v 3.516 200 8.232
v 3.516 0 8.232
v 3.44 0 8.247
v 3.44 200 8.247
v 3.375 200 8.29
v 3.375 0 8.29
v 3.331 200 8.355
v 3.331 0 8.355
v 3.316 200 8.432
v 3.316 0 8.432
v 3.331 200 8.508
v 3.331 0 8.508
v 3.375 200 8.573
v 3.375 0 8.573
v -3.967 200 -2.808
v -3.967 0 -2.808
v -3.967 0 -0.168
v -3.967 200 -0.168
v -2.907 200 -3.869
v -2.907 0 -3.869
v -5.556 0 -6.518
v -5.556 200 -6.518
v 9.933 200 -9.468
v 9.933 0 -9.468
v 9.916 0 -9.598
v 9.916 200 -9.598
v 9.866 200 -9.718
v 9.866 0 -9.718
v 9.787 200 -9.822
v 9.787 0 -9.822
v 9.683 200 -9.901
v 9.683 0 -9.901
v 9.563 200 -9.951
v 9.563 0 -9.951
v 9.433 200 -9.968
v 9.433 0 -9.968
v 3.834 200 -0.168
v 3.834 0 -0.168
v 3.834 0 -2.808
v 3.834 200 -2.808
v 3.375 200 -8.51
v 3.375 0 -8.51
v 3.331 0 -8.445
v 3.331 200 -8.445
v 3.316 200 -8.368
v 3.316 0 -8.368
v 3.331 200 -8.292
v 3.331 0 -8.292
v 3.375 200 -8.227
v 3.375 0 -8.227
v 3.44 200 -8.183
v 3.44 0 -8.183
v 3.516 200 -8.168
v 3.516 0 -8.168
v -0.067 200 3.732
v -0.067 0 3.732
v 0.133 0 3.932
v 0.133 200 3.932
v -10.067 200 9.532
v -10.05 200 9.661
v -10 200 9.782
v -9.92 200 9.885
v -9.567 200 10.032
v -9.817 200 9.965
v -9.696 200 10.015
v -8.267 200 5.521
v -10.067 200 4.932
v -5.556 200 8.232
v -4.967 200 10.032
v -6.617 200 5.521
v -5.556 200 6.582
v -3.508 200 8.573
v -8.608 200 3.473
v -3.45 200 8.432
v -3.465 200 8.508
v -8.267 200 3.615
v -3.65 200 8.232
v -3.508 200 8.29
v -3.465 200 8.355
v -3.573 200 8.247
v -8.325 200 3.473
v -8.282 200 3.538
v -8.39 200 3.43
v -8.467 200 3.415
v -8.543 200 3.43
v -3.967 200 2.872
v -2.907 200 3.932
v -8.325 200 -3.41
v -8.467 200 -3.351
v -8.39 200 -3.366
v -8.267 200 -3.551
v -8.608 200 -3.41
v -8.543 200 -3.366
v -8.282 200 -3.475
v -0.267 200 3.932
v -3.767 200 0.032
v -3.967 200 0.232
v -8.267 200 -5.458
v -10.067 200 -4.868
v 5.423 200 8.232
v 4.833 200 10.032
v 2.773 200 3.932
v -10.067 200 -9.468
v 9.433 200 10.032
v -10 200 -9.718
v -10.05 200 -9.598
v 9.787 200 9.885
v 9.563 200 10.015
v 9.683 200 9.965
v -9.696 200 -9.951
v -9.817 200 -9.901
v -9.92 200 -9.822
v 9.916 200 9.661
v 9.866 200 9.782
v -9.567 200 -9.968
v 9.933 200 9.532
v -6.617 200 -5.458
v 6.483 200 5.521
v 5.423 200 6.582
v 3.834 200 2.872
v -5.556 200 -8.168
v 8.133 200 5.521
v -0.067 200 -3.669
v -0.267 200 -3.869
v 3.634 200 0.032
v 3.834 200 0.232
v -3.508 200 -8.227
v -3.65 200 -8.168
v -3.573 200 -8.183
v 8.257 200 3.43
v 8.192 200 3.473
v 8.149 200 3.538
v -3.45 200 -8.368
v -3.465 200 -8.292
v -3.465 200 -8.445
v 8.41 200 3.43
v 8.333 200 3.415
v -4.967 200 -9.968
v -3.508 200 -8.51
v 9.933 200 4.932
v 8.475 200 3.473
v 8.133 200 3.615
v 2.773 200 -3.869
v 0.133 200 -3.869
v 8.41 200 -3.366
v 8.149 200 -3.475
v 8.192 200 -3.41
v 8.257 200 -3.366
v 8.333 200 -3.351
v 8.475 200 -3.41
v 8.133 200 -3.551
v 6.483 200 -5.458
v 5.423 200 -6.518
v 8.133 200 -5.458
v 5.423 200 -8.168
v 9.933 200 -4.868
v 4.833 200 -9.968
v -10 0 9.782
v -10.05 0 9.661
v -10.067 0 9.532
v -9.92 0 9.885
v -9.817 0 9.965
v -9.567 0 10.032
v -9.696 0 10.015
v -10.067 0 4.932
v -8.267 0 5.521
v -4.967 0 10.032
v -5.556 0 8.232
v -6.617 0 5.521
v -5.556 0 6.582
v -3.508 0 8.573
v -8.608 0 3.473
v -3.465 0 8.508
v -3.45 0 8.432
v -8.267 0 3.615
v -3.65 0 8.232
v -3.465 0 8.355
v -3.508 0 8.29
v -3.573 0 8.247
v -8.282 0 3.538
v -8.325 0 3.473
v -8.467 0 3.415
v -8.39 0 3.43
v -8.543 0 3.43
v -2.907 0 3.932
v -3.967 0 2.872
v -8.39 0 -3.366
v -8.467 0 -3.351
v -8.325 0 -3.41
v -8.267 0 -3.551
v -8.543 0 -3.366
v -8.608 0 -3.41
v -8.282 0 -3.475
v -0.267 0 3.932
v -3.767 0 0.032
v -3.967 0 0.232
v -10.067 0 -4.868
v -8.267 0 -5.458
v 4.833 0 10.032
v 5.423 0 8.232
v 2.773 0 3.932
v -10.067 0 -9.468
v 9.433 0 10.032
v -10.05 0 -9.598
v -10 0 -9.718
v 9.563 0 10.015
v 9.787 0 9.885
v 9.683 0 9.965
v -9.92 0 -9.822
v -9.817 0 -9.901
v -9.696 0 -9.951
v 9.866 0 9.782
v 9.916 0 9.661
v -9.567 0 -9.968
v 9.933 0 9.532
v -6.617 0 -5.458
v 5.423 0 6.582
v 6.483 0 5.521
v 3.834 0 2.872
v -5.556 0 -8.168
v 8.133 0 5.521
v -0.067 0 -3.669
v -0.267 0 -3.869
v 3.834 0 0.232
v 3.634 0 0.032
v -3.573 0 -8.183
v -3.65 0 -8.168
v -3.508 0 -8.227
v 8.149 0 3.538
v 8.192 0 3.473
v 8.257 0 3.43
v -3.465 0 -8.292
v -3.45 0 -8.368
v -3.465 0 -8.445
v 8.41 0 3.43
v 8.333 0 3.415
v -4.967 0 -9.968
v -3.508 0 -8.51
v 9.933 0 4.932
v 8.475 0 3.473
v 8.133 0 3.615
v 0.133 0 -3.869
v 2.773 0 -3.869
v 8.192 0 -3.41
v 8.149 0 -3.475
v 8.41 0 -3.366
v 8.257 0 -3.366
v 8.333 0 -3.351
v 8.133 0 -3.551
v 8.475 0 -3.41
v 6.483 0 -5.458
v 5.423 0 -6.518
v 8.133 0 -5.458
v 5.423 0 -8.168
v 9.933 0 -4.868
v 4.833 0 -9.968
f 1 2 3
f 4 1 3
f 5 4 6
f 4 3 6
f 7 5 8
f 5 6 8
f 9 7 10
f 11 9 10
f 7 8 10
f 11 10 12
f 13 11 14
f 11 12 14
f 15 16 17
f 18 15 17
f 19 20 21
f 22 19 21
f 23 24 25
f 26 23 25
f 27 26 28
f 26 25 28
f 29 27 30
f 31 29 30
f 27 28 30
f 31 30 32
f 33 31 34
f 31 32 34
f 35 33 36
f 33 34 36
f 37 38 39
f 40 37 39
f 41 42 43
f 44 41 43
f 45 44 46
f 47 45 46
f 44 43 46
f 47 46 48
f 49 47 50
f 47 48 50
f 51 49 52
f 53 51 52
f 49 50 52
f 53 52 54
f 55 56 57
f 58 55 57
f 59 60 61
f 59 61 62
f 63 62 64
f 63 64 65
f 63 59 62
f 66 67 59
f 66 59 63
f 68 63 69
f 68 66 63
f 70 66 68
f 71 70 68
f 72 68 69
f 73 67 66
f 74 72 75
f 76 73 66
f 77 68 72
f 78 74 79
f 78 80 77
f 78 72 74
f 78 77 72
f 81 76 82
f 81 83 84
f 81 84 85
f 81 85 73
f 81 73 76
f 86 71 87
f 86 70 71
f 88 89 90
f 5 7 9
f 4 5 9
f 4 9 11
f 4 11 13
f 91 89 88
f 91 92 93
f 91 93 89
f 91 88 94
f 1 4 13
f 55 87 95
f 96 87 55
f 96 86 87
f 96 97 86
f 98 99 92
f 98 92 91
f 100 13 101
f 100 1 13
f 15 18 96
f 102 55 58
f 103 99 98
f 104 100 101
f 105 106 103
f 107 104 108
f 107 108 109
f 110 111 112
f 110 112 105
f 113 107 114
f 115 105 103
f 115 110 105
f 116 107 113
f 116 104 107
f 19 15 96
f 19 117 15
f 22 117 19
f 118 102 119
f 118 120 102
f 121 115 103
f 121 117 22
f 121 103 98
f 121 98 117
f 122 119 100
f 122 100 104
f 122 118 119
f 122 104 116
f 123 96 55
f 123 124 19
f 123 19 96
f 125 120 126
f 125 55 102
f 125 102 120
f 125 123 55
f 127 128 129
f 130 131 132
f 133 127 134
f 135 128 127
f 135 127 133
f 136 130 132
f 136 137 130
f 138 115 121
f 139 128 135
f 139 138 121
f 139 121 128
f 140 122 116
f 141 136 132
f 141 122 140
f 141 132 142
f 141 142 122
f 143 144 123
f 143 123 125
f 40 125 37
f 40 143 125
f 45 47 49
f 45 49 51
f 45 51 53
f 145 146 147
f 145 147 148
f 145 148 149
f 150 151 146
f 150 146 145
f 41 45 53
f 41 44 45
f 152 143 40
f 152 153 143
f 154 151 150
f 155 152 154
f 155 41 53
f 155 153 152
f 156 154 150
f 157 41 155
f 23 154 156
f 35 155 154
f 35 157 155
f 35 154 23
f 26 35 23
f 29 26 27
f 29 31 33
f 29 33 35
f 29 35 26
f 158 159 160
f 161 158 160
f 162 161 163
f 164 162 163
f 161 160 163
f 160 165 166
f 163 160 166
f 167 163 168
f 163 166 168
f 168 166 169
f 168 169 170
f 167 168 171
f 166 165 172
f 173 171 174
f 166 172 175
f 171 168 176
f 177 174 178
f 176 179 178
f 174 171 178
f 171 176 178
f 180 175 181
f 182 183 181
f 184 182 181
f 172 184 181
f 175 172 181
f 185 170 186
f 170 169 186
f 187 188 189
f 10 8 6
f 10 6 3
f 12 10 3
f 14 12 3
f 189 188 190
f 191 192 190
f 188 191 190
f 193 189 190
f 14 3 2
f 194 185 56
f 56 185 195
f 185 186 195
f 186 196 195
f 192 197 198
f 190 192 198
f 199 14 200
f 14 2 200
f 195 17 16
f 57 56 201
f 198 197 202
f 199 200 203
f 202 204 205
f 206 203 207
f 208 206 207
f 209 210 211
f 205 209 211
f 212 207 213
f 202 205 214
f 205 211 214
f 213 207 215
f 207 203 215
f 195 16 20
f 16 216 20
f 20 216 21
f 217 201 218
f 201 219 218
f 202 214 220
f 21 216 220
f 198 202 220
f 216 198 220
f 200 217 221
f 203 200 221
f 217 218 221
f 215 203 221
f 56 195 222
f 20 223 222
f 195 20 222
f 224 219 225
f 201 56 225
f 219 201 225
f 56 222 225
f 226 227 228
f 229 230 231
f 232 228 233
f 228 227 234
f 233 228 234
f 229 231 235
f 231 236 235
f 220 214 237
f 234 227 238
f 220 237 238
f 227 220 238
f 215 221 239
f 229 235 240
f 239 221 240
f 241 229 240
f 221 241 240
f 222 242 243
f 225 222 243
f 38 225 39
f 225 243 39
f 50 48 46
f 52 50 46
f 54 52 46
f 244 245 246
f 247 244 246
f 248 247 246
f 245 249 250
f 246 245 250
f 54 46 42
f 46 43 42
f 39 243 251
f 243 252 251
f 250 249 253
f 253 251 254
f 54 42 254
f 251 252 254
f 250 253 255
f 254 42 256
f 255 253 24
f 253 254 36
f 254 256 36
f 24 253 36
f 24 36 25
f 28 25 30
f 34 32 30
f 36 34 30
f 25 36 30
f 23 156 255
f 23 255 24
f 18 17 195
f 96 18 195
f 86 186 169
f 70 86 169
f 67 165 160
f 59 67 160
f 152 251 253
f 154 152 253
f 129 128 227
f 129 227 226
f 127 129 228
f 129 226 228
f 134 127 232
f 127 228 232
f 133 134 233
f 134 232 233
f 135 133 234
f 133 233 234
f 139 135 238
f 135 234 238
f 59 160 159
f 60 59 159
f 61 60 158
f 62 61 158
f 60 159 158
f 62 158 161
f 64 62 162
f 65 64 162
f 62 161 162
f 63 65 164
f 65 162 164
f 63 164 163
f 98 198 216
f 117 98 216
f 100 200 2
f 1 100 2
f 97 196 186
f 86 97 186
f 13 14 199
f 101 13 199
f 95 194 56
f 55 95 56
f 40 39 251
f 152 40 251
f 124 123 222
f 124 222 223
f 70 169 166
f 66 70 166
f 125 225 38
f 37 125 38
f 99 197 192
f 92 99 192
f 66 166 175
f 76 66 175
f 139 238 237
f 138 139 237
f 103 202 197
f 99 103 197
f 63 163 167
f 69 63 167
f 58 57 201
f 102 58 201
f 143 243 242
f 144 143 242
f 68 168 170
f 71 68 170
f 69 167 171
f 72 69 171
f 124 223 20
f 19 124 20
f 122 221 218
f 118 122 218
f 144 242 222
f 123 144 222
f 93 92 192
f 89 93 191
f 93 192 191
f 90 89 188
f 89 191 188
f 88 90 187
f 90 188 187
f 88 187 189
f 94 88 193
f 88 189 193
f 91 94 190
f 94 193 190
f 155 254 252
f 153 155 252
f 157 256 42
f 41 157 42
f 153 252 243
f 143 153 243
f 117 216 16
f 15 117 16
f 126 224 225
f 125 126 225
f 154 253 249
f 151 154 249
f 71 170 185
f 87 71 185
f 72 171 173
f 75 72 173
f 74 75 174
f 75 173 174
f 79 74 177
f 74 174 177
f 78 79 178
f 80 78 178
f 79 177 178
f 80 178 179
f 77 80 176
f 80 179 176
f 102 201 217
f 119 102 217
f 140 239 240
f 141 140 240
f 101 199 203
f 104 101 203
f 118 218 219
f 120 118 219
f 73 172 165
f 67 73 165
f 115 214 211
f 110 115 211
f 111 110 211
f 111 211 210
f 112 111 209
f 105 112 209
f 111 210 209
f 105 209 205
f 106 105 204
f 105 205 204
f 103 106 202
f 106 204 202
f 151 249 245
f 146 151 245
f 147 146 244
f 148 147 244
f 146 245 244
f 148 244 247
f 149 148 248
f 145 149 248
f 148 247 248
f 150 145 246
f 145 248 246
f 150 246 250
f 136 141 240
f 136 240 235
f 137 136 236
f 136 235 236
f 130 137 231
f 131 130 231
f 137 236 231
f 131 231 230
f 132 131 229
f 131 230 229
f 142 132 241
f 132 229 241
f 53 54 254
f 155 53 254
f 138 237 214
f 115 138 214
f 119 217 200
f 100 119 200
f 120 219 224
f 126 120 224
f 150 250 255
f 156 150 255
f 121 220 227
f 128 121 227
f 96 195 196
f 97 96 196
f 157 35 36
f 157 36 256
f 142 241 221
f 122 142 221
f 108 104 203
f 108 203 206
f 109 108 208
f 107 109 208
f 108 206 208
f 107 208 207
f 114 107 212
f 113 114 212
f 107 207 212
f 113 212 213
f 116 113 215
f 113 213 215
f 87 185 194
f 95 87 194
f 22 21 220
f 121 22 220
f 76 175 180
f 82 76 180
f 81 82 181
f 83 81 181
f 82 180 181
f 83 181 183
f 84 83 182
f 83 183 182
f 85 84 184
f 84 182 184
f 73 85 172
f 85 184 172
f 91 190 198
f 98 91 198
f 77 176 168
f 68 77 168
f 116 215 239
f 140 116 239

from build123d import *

# Parameters (mm, degrees)
BOSS_EXTRUDE1_DEPTH = 200


with BuildPart() as part:
    # Sketch1 → Boss-Extrude1 (new body)
    with BuildSketch(Plane(origin=(0, 0, 0), x_dir=(1, 0, 0), z_dir=(0, 1, 0))):
        with BuildLine():
            Line((-0.266657426, -3.932437418), (-0.066657426, -3.732437418))
            Line((-0.066657426, -3.732437418), (0.133342575, -3.932437418))
            Line((0.133342575, -3.932437418), (2.773342575, -3.932437418))
            Line((2.773342575, -3.932437418), (5.422682403, -6.581777247))
            Line((5.422682403, -6.581777247), (5.422682403, -8.231777247))
            Line((5.422682403, -8.231777247), (3.516185287, -8.231777247))
            ThreePointArc((3.516185287, -8.231777247), (3.331409381, -8.35524056), (3.37476393, -8.573198602))
            Line((3.37476393, -8.573198602), (4.833342574, -10.031777246))
            Line((4.833342574, -10.031777246), (9.433342574, -10.031777246))
            ThreePointArc((9.433342574, -10.031777246), (9.786895965, -9.885330637), (9.933342574, -9.531777246))
            Line((9.933342574, -9.531777246), (9.933342574, -4.931777246))
            Line((9.933342574, -4.931777246), (8.474763931, -3.473198602))
            ThreePointArc((8.474763931, -3.473198602), (8.256805888, -3.429844053), (8.133342575, -3.614619959))
            Line((8.133342575, -3.614619959), (8.133342575, -5.521117075))
            Line((8.133342575, -5.521117075), (6.483342575, -5.521117075))
            Line((6.483342575, -5.521117075), (3.834002746, -2.871777247))
            Line((3.834002746, -2.871777247), (3.834002746, -0.231777247))
            Line((3.834002746, -0.231777247), (3.634002746, -0.031777246))
            Line((3.634002746, -0.031777246), (3.834002746, 0.168222754))
            Line((3.834002746, 0.168222754), (3.834002746, 2.808222754))
            Line((3.834002746, 2.808222754), (6.483342575, 5.457562582))
            Line((6.483342575, 5.457562582), (8.133342575, 5.457562582))
            Line((8.133342575, 5.457562582), (8.133342575, 3.551065466))
            ThreePointArc((8.133342575, 3.551065466), (8.256805888, 3.36628956), (8.474763931, 3.40964411))
            Line((8.474763931, 3.40964411), (9.933342575, 4.868222753))
            Line((9.933342575, 4.868222753), (9.933342575, 9.468222753))
            ThreePointArc((9.933342575, 9.468222753), (9.786895965, 9.821776143), (9.433342575, 9.968222753))
            Line((9.433342575, 9.968222753), (4.833342575, 9.968222753))
            Line((4.833342575, 9.968222753), (3.374763931, 8.50964411))
            ThreePointArc((3.374763931, 8.50964411), (3.331409381, 8.291686067), (3.516185287, 8.168222754))
            Line((3.516185287, 8.168222754), (5.422682403, 8.168222754))
            Line((5.422682403, 8.168222754), (5.422682403, 6.518222754))
            Line((5.422682403, 6.518222754), (2.773342575, 3.868882925))
            Line((2.773342575, 3.868882925), (0.133342575, 3.868882925))
            Line((0.133342575, 3.868882925), (-0.066657426, 3.668882925))
            Line((-0.066657426, 3.668882925), (-0.266657426, 3.868882925))
            Line((-0.266657426, 3.868882925), (-2.906657426, 3.868882925))
            Line((-2.906657426, 3.868882925), (-5.555997254, 6.518222754))
            Line((-5.555997254, 6.518222754), (-5.555997254, 8.168222754))
            Line((-5.555997254, 8.168222754), (-3.649500138, 8.168222754))
            ThreePointArc((-3.649500138, 8.168222754), (-3.464724232, 8.291686067), (-3.508078782, 8.50964411))
            Line((-3.508078782, 8.50964411), (-4.966657426, 9.968222754))
            Line((-4.966657426, 9.968222754), (-9.566657426, 9.968222754))
            ThreePointArc((-9.566657426, 9.968222754), (-9.920210817, 9.821776144), (-10.066657426, 9.468222753))
            Line((-10.066657426, 9.468222753), (-10.066657426, 4.868222753))
            Line((-10.066657426, 4.868222753), (-8.608078782, 3.40964411))
            ThreePointArc((-8.608078782, 3.40964411), (-8.39012074, 3.366289559), (-8.266657426, 3.551065466))
            Line((-8.266657426, 3.551065466), (-8.266657426, 5.457562582))
            Line((-8.266657426, 5.457562582), (-6.616657426, 5.457562582))
            Line((-6.616657426, 5.457562582), (-3.967317598, 2.808222753))
            Line((-3.967317598, 2.808222753), (-3.967317598, 0.168222753))
            Line((-3.967317598, 0.168222753), (-3.767317597, -0.031777246))
            Line((-3.767317597, -0.031777246), (-3.967317598, -0.231777246))
            Line((-3.967317598, -0.231777246), (-3.967317598, -2.871777246))
            Line((-3.967317598, -2.871777246), (-6.616657426, -5.521117075))
            Line((-6.616657426, -5.521117075), (-8.266657426, -5.521117075))
            Line((-8.266657426, -5.521117075), (-8.266657426, -3.614619959))
            ThreePointArc((-8.266657426, -3.614619959), (-8.39012074, -3.429844052), (-8.608078782, -3.473198603))
            Line((-8.608078782, -3.473198603), (-10.066657426, -4.931777246))
            Line((-10.066657426, -4.931777246), (-10.066657426, -9.531777246))
            ThreePointArc((-10.066657426, -9.531777246), (-9.920210817, -9.885330637), (-9.566657426, -10.031777246))
            Line((-9.566657426, -10.031777246), (-4.966657426, -10.031777246))
            Line((-4.966657426, -10.031777246), (-3.508078782, -8.573198603))
            ThreePointArc((-3.508078782, -8.573198603), (-3.464724232, -8.35524056), (-3.649500138, -8.231777246))
            Line((-3.649500138, -8.231777246), (-5.555997254, -8.231777246))
            Line((-5.555997254, -8.231777246), (-5.555997254, -6.581777246))
            Line((-5.555997254, -6.581777246), (-2.906657426, -3.932437418))
            Line((-2.906657426, -3.932437418), (-0.266657426, -3.932437418))
        make_face()
    extrude(amount=BOSS_EXTRUDE1_DEPTH)


solid = part.part
